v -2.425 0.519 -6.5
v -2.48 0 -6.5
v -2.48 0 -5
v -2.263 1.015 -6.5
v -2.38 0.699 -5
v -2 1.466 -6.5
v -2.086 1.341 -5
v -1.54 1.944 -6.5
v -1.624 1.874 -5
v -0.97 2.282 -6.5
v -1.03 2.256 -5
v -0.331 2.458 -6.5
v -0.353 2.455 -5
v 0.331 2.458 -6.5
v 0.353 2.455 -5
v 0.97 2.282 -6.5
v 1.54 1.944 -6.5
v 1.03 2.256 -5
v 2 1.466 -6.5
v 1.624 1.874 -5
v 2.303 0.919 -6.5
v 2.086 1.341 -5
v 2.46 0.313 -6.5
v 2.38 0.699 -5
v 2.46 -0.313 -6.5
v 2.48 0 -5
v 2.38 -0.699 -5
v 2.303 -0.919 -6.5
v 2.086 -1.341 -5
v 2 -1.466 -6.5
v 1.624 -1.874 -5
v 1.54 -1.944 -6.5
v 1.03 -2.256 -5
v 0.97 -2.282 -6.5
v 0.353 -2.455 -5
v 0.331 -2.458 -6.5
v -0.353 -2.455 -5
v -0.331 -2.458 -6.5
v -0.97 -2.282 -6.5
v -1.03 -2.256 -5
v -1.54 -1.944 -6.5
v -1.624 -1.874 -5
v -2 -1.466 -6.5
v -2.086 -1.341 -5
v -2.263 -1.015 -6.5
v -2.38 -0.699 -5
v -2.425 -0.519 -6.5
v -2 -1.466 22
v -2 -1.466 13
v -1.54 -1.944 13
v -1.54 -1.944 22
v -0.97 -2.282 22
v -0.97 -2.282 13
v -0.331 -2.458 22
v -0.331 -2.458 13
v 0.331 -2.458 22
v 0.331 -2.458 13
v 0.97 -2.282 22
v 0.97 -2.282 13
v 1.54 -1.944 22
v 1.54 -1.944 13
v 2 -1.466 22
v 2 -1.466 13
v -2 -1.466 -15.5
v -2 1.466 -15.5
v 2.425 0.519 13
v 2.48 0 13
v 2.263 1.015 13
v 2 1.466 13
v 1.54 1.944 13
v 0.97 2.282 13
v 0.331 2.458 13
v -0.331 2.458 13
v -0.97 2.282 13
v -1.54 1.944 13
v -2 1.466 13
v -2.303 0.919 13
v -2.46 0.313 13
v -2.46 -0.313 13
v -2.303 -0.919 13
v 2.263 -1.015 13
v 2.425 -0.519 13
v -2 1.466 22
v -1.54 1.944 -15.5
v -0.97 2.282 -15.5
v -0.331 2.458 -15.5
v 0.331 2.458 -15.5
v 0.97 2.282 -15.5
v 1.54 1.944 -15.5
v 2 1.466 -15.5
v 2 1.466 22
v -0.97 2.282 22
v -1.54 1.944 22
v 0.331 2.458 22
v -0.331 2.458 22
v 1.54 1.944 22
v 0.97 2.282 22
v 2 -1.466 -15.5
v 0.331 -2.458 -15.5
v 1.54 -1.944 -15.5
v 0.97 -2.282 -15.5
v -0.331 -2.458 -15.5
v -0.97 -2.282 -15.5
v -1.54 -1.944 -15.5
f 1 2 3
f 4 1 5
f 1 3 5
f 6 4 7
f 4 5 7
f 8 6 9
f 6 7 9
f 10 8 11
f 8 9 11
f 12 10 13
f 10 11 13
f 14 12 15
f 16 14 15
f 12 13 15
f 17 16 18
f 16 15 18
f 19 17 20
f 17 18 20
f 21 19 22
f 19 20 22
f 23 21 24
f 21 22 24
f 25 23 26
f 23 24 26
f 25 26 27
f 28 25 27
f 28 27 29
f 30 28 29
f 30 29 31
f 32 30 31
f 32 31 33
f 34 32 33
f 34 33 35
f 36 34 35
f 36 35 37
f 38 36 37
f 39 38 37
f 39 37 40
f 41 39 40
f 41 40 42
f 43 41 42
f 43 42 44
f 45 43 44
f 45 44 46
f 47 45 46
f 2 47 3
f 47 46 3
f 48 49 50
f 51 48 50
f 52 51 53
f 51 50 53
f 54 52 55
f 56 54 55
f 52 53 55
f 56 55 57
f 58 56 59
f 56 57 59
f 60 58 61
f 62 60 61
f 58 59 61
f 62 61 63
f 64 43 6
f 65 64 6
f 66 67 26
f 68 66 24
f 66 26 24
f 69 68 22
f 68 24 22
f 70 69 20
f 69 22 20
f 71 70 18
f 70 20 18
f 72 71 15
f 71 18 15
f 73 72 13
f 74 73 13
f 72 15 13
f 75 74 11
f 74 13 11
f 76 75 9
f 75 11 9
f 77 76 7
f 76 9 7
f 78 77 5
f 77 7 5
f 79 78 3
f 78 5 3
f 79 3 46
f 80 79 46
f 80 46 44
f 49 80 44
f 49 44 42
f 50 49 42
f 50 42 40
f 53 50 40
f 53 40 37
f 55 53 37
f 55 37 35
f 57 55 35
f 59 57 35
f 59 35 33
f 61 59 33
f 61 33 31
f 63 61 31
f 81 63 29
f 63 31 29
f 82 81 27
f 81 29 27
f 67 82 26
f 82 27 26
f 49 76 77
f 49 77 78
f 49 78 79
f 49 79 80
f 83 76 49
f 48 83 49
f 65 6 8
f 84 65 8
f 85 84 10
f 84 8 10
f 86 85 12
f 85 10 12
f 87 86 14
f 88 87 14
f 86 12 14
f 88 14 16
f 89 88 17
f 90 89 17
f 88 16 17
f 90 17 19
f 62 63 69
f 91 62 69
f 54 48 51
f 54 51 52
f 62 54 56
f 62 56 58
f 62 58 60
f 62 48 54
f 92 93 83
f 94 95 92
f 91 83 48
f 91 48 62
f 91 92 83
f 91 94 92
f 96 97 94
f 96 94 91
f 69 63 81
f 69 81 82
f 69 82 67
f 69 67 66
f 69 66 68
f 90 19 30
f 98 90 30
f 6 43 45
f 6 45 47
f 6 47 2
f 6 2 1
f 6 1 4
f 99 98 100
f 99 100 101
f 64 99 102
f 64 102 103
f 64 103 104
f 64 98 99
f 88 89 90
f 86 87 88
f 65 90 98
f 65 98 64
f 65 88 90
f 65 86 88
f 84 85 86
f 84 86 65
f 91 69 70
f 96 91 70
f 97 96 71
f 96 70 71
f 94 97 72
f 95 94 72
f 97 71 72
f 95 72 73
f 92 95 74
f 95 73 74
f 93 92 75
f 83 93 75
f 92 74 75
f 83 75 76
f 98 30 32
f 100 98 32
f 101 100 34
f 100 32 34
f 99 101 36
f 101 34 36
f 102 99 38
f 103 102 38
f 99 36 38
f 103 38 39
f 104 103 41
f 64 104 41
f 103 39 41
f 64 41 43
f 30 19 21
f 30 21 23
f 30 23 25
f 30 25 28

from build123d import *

# Parameters (mm, degrees)
SKETCH1_R                = 2.48
BOSS_EXTRUDE1_DEPTH      = 11
BOSS_EXTRUDE1_DEPTH_BACK = 5
SKETCH2_R                = 2.48
BOSS_EXTRUDE2_DEPTH      = 2
BOSS_EXTRUDE3_DEPTH      = 9
SKETCH4_R                = 2.48
BOSS_EXTRUDE4_DEPTH      = 1.5
BOSS_EXTRUDE5_DEPTH      = 9


with BuildPart() as part:
    # Sketch1 → Boss-Extrude1 (new body, two sides)
    with BuildSketch(Plane.XY) as boss_extrude1_sk:
        Circle(SKETCH1_R)
    extrude(amount=BOSS_EXTRUDE1_DEPTH)
    extrude(boss_extrude1_sk.sketch, amount=-BOSS_EXTRUDE1_DEPTH_BACK)

    # Sketch2 → Boss-Extrude2 (add)
    with BuildSketch(Plane.XY.offset(11)):
        Circle(SKETCH2_R)
    extrude(amount=BOSS_EXTRUDE2_DEPTH)

    # Sketch3 → Boss-Extrude3 (add)
    with BuildSketch(Plane.XY.offset(13)):
        with BuildLine():
            ThreePointArc((2, 1.466424222), (0, 2.48), (-2, 1.466424222))
            Line((-2, 1.466424222), (-2, -1.466424222))
            ThreePointArc((-2, -1.466424222), (0, -2.48), (2, -1.466424222))
            Line((2, -1.466424222), (2, 1.466424222))
        make_face()
    extrude(amount=BOSS_EXTRUDE3_DEPTH)

    # Sketch4 → Boss-Extrude4 (add)
    with BuildSketch(Plane(origin=(0, 0, -5), x_dir=(-1, 0, 0), z_dir=(0, 0, -1))):
        Circle(SKETCH4_R)
    extrude(amount=BOSS_EXTRUDE4_DEPTH)

    # Sketch5 → Boss-Extrude5 (add)
    with BuildSketch(Plane(origin=(0, 0, -6.5), x_dir=(-1, 0, 0), z_dir=(0, 0, -1))):
        with BuildLine():
            ThreePointArc((2, 1.466424222), (0, 2.48), (-2, 1.466424222))
            Line((-2, 1.466424222), (-2, -1.466424222))
            ThreePointArc((-2, -1.466424222), (0, -2.48), (2, -1.466424222))
            Line((2, -1.466424222), (2, 1.466424222))
        make_face()
    extrude(amount=BOSS_EXTRUDE5_DEPTH)


solid = part.part
